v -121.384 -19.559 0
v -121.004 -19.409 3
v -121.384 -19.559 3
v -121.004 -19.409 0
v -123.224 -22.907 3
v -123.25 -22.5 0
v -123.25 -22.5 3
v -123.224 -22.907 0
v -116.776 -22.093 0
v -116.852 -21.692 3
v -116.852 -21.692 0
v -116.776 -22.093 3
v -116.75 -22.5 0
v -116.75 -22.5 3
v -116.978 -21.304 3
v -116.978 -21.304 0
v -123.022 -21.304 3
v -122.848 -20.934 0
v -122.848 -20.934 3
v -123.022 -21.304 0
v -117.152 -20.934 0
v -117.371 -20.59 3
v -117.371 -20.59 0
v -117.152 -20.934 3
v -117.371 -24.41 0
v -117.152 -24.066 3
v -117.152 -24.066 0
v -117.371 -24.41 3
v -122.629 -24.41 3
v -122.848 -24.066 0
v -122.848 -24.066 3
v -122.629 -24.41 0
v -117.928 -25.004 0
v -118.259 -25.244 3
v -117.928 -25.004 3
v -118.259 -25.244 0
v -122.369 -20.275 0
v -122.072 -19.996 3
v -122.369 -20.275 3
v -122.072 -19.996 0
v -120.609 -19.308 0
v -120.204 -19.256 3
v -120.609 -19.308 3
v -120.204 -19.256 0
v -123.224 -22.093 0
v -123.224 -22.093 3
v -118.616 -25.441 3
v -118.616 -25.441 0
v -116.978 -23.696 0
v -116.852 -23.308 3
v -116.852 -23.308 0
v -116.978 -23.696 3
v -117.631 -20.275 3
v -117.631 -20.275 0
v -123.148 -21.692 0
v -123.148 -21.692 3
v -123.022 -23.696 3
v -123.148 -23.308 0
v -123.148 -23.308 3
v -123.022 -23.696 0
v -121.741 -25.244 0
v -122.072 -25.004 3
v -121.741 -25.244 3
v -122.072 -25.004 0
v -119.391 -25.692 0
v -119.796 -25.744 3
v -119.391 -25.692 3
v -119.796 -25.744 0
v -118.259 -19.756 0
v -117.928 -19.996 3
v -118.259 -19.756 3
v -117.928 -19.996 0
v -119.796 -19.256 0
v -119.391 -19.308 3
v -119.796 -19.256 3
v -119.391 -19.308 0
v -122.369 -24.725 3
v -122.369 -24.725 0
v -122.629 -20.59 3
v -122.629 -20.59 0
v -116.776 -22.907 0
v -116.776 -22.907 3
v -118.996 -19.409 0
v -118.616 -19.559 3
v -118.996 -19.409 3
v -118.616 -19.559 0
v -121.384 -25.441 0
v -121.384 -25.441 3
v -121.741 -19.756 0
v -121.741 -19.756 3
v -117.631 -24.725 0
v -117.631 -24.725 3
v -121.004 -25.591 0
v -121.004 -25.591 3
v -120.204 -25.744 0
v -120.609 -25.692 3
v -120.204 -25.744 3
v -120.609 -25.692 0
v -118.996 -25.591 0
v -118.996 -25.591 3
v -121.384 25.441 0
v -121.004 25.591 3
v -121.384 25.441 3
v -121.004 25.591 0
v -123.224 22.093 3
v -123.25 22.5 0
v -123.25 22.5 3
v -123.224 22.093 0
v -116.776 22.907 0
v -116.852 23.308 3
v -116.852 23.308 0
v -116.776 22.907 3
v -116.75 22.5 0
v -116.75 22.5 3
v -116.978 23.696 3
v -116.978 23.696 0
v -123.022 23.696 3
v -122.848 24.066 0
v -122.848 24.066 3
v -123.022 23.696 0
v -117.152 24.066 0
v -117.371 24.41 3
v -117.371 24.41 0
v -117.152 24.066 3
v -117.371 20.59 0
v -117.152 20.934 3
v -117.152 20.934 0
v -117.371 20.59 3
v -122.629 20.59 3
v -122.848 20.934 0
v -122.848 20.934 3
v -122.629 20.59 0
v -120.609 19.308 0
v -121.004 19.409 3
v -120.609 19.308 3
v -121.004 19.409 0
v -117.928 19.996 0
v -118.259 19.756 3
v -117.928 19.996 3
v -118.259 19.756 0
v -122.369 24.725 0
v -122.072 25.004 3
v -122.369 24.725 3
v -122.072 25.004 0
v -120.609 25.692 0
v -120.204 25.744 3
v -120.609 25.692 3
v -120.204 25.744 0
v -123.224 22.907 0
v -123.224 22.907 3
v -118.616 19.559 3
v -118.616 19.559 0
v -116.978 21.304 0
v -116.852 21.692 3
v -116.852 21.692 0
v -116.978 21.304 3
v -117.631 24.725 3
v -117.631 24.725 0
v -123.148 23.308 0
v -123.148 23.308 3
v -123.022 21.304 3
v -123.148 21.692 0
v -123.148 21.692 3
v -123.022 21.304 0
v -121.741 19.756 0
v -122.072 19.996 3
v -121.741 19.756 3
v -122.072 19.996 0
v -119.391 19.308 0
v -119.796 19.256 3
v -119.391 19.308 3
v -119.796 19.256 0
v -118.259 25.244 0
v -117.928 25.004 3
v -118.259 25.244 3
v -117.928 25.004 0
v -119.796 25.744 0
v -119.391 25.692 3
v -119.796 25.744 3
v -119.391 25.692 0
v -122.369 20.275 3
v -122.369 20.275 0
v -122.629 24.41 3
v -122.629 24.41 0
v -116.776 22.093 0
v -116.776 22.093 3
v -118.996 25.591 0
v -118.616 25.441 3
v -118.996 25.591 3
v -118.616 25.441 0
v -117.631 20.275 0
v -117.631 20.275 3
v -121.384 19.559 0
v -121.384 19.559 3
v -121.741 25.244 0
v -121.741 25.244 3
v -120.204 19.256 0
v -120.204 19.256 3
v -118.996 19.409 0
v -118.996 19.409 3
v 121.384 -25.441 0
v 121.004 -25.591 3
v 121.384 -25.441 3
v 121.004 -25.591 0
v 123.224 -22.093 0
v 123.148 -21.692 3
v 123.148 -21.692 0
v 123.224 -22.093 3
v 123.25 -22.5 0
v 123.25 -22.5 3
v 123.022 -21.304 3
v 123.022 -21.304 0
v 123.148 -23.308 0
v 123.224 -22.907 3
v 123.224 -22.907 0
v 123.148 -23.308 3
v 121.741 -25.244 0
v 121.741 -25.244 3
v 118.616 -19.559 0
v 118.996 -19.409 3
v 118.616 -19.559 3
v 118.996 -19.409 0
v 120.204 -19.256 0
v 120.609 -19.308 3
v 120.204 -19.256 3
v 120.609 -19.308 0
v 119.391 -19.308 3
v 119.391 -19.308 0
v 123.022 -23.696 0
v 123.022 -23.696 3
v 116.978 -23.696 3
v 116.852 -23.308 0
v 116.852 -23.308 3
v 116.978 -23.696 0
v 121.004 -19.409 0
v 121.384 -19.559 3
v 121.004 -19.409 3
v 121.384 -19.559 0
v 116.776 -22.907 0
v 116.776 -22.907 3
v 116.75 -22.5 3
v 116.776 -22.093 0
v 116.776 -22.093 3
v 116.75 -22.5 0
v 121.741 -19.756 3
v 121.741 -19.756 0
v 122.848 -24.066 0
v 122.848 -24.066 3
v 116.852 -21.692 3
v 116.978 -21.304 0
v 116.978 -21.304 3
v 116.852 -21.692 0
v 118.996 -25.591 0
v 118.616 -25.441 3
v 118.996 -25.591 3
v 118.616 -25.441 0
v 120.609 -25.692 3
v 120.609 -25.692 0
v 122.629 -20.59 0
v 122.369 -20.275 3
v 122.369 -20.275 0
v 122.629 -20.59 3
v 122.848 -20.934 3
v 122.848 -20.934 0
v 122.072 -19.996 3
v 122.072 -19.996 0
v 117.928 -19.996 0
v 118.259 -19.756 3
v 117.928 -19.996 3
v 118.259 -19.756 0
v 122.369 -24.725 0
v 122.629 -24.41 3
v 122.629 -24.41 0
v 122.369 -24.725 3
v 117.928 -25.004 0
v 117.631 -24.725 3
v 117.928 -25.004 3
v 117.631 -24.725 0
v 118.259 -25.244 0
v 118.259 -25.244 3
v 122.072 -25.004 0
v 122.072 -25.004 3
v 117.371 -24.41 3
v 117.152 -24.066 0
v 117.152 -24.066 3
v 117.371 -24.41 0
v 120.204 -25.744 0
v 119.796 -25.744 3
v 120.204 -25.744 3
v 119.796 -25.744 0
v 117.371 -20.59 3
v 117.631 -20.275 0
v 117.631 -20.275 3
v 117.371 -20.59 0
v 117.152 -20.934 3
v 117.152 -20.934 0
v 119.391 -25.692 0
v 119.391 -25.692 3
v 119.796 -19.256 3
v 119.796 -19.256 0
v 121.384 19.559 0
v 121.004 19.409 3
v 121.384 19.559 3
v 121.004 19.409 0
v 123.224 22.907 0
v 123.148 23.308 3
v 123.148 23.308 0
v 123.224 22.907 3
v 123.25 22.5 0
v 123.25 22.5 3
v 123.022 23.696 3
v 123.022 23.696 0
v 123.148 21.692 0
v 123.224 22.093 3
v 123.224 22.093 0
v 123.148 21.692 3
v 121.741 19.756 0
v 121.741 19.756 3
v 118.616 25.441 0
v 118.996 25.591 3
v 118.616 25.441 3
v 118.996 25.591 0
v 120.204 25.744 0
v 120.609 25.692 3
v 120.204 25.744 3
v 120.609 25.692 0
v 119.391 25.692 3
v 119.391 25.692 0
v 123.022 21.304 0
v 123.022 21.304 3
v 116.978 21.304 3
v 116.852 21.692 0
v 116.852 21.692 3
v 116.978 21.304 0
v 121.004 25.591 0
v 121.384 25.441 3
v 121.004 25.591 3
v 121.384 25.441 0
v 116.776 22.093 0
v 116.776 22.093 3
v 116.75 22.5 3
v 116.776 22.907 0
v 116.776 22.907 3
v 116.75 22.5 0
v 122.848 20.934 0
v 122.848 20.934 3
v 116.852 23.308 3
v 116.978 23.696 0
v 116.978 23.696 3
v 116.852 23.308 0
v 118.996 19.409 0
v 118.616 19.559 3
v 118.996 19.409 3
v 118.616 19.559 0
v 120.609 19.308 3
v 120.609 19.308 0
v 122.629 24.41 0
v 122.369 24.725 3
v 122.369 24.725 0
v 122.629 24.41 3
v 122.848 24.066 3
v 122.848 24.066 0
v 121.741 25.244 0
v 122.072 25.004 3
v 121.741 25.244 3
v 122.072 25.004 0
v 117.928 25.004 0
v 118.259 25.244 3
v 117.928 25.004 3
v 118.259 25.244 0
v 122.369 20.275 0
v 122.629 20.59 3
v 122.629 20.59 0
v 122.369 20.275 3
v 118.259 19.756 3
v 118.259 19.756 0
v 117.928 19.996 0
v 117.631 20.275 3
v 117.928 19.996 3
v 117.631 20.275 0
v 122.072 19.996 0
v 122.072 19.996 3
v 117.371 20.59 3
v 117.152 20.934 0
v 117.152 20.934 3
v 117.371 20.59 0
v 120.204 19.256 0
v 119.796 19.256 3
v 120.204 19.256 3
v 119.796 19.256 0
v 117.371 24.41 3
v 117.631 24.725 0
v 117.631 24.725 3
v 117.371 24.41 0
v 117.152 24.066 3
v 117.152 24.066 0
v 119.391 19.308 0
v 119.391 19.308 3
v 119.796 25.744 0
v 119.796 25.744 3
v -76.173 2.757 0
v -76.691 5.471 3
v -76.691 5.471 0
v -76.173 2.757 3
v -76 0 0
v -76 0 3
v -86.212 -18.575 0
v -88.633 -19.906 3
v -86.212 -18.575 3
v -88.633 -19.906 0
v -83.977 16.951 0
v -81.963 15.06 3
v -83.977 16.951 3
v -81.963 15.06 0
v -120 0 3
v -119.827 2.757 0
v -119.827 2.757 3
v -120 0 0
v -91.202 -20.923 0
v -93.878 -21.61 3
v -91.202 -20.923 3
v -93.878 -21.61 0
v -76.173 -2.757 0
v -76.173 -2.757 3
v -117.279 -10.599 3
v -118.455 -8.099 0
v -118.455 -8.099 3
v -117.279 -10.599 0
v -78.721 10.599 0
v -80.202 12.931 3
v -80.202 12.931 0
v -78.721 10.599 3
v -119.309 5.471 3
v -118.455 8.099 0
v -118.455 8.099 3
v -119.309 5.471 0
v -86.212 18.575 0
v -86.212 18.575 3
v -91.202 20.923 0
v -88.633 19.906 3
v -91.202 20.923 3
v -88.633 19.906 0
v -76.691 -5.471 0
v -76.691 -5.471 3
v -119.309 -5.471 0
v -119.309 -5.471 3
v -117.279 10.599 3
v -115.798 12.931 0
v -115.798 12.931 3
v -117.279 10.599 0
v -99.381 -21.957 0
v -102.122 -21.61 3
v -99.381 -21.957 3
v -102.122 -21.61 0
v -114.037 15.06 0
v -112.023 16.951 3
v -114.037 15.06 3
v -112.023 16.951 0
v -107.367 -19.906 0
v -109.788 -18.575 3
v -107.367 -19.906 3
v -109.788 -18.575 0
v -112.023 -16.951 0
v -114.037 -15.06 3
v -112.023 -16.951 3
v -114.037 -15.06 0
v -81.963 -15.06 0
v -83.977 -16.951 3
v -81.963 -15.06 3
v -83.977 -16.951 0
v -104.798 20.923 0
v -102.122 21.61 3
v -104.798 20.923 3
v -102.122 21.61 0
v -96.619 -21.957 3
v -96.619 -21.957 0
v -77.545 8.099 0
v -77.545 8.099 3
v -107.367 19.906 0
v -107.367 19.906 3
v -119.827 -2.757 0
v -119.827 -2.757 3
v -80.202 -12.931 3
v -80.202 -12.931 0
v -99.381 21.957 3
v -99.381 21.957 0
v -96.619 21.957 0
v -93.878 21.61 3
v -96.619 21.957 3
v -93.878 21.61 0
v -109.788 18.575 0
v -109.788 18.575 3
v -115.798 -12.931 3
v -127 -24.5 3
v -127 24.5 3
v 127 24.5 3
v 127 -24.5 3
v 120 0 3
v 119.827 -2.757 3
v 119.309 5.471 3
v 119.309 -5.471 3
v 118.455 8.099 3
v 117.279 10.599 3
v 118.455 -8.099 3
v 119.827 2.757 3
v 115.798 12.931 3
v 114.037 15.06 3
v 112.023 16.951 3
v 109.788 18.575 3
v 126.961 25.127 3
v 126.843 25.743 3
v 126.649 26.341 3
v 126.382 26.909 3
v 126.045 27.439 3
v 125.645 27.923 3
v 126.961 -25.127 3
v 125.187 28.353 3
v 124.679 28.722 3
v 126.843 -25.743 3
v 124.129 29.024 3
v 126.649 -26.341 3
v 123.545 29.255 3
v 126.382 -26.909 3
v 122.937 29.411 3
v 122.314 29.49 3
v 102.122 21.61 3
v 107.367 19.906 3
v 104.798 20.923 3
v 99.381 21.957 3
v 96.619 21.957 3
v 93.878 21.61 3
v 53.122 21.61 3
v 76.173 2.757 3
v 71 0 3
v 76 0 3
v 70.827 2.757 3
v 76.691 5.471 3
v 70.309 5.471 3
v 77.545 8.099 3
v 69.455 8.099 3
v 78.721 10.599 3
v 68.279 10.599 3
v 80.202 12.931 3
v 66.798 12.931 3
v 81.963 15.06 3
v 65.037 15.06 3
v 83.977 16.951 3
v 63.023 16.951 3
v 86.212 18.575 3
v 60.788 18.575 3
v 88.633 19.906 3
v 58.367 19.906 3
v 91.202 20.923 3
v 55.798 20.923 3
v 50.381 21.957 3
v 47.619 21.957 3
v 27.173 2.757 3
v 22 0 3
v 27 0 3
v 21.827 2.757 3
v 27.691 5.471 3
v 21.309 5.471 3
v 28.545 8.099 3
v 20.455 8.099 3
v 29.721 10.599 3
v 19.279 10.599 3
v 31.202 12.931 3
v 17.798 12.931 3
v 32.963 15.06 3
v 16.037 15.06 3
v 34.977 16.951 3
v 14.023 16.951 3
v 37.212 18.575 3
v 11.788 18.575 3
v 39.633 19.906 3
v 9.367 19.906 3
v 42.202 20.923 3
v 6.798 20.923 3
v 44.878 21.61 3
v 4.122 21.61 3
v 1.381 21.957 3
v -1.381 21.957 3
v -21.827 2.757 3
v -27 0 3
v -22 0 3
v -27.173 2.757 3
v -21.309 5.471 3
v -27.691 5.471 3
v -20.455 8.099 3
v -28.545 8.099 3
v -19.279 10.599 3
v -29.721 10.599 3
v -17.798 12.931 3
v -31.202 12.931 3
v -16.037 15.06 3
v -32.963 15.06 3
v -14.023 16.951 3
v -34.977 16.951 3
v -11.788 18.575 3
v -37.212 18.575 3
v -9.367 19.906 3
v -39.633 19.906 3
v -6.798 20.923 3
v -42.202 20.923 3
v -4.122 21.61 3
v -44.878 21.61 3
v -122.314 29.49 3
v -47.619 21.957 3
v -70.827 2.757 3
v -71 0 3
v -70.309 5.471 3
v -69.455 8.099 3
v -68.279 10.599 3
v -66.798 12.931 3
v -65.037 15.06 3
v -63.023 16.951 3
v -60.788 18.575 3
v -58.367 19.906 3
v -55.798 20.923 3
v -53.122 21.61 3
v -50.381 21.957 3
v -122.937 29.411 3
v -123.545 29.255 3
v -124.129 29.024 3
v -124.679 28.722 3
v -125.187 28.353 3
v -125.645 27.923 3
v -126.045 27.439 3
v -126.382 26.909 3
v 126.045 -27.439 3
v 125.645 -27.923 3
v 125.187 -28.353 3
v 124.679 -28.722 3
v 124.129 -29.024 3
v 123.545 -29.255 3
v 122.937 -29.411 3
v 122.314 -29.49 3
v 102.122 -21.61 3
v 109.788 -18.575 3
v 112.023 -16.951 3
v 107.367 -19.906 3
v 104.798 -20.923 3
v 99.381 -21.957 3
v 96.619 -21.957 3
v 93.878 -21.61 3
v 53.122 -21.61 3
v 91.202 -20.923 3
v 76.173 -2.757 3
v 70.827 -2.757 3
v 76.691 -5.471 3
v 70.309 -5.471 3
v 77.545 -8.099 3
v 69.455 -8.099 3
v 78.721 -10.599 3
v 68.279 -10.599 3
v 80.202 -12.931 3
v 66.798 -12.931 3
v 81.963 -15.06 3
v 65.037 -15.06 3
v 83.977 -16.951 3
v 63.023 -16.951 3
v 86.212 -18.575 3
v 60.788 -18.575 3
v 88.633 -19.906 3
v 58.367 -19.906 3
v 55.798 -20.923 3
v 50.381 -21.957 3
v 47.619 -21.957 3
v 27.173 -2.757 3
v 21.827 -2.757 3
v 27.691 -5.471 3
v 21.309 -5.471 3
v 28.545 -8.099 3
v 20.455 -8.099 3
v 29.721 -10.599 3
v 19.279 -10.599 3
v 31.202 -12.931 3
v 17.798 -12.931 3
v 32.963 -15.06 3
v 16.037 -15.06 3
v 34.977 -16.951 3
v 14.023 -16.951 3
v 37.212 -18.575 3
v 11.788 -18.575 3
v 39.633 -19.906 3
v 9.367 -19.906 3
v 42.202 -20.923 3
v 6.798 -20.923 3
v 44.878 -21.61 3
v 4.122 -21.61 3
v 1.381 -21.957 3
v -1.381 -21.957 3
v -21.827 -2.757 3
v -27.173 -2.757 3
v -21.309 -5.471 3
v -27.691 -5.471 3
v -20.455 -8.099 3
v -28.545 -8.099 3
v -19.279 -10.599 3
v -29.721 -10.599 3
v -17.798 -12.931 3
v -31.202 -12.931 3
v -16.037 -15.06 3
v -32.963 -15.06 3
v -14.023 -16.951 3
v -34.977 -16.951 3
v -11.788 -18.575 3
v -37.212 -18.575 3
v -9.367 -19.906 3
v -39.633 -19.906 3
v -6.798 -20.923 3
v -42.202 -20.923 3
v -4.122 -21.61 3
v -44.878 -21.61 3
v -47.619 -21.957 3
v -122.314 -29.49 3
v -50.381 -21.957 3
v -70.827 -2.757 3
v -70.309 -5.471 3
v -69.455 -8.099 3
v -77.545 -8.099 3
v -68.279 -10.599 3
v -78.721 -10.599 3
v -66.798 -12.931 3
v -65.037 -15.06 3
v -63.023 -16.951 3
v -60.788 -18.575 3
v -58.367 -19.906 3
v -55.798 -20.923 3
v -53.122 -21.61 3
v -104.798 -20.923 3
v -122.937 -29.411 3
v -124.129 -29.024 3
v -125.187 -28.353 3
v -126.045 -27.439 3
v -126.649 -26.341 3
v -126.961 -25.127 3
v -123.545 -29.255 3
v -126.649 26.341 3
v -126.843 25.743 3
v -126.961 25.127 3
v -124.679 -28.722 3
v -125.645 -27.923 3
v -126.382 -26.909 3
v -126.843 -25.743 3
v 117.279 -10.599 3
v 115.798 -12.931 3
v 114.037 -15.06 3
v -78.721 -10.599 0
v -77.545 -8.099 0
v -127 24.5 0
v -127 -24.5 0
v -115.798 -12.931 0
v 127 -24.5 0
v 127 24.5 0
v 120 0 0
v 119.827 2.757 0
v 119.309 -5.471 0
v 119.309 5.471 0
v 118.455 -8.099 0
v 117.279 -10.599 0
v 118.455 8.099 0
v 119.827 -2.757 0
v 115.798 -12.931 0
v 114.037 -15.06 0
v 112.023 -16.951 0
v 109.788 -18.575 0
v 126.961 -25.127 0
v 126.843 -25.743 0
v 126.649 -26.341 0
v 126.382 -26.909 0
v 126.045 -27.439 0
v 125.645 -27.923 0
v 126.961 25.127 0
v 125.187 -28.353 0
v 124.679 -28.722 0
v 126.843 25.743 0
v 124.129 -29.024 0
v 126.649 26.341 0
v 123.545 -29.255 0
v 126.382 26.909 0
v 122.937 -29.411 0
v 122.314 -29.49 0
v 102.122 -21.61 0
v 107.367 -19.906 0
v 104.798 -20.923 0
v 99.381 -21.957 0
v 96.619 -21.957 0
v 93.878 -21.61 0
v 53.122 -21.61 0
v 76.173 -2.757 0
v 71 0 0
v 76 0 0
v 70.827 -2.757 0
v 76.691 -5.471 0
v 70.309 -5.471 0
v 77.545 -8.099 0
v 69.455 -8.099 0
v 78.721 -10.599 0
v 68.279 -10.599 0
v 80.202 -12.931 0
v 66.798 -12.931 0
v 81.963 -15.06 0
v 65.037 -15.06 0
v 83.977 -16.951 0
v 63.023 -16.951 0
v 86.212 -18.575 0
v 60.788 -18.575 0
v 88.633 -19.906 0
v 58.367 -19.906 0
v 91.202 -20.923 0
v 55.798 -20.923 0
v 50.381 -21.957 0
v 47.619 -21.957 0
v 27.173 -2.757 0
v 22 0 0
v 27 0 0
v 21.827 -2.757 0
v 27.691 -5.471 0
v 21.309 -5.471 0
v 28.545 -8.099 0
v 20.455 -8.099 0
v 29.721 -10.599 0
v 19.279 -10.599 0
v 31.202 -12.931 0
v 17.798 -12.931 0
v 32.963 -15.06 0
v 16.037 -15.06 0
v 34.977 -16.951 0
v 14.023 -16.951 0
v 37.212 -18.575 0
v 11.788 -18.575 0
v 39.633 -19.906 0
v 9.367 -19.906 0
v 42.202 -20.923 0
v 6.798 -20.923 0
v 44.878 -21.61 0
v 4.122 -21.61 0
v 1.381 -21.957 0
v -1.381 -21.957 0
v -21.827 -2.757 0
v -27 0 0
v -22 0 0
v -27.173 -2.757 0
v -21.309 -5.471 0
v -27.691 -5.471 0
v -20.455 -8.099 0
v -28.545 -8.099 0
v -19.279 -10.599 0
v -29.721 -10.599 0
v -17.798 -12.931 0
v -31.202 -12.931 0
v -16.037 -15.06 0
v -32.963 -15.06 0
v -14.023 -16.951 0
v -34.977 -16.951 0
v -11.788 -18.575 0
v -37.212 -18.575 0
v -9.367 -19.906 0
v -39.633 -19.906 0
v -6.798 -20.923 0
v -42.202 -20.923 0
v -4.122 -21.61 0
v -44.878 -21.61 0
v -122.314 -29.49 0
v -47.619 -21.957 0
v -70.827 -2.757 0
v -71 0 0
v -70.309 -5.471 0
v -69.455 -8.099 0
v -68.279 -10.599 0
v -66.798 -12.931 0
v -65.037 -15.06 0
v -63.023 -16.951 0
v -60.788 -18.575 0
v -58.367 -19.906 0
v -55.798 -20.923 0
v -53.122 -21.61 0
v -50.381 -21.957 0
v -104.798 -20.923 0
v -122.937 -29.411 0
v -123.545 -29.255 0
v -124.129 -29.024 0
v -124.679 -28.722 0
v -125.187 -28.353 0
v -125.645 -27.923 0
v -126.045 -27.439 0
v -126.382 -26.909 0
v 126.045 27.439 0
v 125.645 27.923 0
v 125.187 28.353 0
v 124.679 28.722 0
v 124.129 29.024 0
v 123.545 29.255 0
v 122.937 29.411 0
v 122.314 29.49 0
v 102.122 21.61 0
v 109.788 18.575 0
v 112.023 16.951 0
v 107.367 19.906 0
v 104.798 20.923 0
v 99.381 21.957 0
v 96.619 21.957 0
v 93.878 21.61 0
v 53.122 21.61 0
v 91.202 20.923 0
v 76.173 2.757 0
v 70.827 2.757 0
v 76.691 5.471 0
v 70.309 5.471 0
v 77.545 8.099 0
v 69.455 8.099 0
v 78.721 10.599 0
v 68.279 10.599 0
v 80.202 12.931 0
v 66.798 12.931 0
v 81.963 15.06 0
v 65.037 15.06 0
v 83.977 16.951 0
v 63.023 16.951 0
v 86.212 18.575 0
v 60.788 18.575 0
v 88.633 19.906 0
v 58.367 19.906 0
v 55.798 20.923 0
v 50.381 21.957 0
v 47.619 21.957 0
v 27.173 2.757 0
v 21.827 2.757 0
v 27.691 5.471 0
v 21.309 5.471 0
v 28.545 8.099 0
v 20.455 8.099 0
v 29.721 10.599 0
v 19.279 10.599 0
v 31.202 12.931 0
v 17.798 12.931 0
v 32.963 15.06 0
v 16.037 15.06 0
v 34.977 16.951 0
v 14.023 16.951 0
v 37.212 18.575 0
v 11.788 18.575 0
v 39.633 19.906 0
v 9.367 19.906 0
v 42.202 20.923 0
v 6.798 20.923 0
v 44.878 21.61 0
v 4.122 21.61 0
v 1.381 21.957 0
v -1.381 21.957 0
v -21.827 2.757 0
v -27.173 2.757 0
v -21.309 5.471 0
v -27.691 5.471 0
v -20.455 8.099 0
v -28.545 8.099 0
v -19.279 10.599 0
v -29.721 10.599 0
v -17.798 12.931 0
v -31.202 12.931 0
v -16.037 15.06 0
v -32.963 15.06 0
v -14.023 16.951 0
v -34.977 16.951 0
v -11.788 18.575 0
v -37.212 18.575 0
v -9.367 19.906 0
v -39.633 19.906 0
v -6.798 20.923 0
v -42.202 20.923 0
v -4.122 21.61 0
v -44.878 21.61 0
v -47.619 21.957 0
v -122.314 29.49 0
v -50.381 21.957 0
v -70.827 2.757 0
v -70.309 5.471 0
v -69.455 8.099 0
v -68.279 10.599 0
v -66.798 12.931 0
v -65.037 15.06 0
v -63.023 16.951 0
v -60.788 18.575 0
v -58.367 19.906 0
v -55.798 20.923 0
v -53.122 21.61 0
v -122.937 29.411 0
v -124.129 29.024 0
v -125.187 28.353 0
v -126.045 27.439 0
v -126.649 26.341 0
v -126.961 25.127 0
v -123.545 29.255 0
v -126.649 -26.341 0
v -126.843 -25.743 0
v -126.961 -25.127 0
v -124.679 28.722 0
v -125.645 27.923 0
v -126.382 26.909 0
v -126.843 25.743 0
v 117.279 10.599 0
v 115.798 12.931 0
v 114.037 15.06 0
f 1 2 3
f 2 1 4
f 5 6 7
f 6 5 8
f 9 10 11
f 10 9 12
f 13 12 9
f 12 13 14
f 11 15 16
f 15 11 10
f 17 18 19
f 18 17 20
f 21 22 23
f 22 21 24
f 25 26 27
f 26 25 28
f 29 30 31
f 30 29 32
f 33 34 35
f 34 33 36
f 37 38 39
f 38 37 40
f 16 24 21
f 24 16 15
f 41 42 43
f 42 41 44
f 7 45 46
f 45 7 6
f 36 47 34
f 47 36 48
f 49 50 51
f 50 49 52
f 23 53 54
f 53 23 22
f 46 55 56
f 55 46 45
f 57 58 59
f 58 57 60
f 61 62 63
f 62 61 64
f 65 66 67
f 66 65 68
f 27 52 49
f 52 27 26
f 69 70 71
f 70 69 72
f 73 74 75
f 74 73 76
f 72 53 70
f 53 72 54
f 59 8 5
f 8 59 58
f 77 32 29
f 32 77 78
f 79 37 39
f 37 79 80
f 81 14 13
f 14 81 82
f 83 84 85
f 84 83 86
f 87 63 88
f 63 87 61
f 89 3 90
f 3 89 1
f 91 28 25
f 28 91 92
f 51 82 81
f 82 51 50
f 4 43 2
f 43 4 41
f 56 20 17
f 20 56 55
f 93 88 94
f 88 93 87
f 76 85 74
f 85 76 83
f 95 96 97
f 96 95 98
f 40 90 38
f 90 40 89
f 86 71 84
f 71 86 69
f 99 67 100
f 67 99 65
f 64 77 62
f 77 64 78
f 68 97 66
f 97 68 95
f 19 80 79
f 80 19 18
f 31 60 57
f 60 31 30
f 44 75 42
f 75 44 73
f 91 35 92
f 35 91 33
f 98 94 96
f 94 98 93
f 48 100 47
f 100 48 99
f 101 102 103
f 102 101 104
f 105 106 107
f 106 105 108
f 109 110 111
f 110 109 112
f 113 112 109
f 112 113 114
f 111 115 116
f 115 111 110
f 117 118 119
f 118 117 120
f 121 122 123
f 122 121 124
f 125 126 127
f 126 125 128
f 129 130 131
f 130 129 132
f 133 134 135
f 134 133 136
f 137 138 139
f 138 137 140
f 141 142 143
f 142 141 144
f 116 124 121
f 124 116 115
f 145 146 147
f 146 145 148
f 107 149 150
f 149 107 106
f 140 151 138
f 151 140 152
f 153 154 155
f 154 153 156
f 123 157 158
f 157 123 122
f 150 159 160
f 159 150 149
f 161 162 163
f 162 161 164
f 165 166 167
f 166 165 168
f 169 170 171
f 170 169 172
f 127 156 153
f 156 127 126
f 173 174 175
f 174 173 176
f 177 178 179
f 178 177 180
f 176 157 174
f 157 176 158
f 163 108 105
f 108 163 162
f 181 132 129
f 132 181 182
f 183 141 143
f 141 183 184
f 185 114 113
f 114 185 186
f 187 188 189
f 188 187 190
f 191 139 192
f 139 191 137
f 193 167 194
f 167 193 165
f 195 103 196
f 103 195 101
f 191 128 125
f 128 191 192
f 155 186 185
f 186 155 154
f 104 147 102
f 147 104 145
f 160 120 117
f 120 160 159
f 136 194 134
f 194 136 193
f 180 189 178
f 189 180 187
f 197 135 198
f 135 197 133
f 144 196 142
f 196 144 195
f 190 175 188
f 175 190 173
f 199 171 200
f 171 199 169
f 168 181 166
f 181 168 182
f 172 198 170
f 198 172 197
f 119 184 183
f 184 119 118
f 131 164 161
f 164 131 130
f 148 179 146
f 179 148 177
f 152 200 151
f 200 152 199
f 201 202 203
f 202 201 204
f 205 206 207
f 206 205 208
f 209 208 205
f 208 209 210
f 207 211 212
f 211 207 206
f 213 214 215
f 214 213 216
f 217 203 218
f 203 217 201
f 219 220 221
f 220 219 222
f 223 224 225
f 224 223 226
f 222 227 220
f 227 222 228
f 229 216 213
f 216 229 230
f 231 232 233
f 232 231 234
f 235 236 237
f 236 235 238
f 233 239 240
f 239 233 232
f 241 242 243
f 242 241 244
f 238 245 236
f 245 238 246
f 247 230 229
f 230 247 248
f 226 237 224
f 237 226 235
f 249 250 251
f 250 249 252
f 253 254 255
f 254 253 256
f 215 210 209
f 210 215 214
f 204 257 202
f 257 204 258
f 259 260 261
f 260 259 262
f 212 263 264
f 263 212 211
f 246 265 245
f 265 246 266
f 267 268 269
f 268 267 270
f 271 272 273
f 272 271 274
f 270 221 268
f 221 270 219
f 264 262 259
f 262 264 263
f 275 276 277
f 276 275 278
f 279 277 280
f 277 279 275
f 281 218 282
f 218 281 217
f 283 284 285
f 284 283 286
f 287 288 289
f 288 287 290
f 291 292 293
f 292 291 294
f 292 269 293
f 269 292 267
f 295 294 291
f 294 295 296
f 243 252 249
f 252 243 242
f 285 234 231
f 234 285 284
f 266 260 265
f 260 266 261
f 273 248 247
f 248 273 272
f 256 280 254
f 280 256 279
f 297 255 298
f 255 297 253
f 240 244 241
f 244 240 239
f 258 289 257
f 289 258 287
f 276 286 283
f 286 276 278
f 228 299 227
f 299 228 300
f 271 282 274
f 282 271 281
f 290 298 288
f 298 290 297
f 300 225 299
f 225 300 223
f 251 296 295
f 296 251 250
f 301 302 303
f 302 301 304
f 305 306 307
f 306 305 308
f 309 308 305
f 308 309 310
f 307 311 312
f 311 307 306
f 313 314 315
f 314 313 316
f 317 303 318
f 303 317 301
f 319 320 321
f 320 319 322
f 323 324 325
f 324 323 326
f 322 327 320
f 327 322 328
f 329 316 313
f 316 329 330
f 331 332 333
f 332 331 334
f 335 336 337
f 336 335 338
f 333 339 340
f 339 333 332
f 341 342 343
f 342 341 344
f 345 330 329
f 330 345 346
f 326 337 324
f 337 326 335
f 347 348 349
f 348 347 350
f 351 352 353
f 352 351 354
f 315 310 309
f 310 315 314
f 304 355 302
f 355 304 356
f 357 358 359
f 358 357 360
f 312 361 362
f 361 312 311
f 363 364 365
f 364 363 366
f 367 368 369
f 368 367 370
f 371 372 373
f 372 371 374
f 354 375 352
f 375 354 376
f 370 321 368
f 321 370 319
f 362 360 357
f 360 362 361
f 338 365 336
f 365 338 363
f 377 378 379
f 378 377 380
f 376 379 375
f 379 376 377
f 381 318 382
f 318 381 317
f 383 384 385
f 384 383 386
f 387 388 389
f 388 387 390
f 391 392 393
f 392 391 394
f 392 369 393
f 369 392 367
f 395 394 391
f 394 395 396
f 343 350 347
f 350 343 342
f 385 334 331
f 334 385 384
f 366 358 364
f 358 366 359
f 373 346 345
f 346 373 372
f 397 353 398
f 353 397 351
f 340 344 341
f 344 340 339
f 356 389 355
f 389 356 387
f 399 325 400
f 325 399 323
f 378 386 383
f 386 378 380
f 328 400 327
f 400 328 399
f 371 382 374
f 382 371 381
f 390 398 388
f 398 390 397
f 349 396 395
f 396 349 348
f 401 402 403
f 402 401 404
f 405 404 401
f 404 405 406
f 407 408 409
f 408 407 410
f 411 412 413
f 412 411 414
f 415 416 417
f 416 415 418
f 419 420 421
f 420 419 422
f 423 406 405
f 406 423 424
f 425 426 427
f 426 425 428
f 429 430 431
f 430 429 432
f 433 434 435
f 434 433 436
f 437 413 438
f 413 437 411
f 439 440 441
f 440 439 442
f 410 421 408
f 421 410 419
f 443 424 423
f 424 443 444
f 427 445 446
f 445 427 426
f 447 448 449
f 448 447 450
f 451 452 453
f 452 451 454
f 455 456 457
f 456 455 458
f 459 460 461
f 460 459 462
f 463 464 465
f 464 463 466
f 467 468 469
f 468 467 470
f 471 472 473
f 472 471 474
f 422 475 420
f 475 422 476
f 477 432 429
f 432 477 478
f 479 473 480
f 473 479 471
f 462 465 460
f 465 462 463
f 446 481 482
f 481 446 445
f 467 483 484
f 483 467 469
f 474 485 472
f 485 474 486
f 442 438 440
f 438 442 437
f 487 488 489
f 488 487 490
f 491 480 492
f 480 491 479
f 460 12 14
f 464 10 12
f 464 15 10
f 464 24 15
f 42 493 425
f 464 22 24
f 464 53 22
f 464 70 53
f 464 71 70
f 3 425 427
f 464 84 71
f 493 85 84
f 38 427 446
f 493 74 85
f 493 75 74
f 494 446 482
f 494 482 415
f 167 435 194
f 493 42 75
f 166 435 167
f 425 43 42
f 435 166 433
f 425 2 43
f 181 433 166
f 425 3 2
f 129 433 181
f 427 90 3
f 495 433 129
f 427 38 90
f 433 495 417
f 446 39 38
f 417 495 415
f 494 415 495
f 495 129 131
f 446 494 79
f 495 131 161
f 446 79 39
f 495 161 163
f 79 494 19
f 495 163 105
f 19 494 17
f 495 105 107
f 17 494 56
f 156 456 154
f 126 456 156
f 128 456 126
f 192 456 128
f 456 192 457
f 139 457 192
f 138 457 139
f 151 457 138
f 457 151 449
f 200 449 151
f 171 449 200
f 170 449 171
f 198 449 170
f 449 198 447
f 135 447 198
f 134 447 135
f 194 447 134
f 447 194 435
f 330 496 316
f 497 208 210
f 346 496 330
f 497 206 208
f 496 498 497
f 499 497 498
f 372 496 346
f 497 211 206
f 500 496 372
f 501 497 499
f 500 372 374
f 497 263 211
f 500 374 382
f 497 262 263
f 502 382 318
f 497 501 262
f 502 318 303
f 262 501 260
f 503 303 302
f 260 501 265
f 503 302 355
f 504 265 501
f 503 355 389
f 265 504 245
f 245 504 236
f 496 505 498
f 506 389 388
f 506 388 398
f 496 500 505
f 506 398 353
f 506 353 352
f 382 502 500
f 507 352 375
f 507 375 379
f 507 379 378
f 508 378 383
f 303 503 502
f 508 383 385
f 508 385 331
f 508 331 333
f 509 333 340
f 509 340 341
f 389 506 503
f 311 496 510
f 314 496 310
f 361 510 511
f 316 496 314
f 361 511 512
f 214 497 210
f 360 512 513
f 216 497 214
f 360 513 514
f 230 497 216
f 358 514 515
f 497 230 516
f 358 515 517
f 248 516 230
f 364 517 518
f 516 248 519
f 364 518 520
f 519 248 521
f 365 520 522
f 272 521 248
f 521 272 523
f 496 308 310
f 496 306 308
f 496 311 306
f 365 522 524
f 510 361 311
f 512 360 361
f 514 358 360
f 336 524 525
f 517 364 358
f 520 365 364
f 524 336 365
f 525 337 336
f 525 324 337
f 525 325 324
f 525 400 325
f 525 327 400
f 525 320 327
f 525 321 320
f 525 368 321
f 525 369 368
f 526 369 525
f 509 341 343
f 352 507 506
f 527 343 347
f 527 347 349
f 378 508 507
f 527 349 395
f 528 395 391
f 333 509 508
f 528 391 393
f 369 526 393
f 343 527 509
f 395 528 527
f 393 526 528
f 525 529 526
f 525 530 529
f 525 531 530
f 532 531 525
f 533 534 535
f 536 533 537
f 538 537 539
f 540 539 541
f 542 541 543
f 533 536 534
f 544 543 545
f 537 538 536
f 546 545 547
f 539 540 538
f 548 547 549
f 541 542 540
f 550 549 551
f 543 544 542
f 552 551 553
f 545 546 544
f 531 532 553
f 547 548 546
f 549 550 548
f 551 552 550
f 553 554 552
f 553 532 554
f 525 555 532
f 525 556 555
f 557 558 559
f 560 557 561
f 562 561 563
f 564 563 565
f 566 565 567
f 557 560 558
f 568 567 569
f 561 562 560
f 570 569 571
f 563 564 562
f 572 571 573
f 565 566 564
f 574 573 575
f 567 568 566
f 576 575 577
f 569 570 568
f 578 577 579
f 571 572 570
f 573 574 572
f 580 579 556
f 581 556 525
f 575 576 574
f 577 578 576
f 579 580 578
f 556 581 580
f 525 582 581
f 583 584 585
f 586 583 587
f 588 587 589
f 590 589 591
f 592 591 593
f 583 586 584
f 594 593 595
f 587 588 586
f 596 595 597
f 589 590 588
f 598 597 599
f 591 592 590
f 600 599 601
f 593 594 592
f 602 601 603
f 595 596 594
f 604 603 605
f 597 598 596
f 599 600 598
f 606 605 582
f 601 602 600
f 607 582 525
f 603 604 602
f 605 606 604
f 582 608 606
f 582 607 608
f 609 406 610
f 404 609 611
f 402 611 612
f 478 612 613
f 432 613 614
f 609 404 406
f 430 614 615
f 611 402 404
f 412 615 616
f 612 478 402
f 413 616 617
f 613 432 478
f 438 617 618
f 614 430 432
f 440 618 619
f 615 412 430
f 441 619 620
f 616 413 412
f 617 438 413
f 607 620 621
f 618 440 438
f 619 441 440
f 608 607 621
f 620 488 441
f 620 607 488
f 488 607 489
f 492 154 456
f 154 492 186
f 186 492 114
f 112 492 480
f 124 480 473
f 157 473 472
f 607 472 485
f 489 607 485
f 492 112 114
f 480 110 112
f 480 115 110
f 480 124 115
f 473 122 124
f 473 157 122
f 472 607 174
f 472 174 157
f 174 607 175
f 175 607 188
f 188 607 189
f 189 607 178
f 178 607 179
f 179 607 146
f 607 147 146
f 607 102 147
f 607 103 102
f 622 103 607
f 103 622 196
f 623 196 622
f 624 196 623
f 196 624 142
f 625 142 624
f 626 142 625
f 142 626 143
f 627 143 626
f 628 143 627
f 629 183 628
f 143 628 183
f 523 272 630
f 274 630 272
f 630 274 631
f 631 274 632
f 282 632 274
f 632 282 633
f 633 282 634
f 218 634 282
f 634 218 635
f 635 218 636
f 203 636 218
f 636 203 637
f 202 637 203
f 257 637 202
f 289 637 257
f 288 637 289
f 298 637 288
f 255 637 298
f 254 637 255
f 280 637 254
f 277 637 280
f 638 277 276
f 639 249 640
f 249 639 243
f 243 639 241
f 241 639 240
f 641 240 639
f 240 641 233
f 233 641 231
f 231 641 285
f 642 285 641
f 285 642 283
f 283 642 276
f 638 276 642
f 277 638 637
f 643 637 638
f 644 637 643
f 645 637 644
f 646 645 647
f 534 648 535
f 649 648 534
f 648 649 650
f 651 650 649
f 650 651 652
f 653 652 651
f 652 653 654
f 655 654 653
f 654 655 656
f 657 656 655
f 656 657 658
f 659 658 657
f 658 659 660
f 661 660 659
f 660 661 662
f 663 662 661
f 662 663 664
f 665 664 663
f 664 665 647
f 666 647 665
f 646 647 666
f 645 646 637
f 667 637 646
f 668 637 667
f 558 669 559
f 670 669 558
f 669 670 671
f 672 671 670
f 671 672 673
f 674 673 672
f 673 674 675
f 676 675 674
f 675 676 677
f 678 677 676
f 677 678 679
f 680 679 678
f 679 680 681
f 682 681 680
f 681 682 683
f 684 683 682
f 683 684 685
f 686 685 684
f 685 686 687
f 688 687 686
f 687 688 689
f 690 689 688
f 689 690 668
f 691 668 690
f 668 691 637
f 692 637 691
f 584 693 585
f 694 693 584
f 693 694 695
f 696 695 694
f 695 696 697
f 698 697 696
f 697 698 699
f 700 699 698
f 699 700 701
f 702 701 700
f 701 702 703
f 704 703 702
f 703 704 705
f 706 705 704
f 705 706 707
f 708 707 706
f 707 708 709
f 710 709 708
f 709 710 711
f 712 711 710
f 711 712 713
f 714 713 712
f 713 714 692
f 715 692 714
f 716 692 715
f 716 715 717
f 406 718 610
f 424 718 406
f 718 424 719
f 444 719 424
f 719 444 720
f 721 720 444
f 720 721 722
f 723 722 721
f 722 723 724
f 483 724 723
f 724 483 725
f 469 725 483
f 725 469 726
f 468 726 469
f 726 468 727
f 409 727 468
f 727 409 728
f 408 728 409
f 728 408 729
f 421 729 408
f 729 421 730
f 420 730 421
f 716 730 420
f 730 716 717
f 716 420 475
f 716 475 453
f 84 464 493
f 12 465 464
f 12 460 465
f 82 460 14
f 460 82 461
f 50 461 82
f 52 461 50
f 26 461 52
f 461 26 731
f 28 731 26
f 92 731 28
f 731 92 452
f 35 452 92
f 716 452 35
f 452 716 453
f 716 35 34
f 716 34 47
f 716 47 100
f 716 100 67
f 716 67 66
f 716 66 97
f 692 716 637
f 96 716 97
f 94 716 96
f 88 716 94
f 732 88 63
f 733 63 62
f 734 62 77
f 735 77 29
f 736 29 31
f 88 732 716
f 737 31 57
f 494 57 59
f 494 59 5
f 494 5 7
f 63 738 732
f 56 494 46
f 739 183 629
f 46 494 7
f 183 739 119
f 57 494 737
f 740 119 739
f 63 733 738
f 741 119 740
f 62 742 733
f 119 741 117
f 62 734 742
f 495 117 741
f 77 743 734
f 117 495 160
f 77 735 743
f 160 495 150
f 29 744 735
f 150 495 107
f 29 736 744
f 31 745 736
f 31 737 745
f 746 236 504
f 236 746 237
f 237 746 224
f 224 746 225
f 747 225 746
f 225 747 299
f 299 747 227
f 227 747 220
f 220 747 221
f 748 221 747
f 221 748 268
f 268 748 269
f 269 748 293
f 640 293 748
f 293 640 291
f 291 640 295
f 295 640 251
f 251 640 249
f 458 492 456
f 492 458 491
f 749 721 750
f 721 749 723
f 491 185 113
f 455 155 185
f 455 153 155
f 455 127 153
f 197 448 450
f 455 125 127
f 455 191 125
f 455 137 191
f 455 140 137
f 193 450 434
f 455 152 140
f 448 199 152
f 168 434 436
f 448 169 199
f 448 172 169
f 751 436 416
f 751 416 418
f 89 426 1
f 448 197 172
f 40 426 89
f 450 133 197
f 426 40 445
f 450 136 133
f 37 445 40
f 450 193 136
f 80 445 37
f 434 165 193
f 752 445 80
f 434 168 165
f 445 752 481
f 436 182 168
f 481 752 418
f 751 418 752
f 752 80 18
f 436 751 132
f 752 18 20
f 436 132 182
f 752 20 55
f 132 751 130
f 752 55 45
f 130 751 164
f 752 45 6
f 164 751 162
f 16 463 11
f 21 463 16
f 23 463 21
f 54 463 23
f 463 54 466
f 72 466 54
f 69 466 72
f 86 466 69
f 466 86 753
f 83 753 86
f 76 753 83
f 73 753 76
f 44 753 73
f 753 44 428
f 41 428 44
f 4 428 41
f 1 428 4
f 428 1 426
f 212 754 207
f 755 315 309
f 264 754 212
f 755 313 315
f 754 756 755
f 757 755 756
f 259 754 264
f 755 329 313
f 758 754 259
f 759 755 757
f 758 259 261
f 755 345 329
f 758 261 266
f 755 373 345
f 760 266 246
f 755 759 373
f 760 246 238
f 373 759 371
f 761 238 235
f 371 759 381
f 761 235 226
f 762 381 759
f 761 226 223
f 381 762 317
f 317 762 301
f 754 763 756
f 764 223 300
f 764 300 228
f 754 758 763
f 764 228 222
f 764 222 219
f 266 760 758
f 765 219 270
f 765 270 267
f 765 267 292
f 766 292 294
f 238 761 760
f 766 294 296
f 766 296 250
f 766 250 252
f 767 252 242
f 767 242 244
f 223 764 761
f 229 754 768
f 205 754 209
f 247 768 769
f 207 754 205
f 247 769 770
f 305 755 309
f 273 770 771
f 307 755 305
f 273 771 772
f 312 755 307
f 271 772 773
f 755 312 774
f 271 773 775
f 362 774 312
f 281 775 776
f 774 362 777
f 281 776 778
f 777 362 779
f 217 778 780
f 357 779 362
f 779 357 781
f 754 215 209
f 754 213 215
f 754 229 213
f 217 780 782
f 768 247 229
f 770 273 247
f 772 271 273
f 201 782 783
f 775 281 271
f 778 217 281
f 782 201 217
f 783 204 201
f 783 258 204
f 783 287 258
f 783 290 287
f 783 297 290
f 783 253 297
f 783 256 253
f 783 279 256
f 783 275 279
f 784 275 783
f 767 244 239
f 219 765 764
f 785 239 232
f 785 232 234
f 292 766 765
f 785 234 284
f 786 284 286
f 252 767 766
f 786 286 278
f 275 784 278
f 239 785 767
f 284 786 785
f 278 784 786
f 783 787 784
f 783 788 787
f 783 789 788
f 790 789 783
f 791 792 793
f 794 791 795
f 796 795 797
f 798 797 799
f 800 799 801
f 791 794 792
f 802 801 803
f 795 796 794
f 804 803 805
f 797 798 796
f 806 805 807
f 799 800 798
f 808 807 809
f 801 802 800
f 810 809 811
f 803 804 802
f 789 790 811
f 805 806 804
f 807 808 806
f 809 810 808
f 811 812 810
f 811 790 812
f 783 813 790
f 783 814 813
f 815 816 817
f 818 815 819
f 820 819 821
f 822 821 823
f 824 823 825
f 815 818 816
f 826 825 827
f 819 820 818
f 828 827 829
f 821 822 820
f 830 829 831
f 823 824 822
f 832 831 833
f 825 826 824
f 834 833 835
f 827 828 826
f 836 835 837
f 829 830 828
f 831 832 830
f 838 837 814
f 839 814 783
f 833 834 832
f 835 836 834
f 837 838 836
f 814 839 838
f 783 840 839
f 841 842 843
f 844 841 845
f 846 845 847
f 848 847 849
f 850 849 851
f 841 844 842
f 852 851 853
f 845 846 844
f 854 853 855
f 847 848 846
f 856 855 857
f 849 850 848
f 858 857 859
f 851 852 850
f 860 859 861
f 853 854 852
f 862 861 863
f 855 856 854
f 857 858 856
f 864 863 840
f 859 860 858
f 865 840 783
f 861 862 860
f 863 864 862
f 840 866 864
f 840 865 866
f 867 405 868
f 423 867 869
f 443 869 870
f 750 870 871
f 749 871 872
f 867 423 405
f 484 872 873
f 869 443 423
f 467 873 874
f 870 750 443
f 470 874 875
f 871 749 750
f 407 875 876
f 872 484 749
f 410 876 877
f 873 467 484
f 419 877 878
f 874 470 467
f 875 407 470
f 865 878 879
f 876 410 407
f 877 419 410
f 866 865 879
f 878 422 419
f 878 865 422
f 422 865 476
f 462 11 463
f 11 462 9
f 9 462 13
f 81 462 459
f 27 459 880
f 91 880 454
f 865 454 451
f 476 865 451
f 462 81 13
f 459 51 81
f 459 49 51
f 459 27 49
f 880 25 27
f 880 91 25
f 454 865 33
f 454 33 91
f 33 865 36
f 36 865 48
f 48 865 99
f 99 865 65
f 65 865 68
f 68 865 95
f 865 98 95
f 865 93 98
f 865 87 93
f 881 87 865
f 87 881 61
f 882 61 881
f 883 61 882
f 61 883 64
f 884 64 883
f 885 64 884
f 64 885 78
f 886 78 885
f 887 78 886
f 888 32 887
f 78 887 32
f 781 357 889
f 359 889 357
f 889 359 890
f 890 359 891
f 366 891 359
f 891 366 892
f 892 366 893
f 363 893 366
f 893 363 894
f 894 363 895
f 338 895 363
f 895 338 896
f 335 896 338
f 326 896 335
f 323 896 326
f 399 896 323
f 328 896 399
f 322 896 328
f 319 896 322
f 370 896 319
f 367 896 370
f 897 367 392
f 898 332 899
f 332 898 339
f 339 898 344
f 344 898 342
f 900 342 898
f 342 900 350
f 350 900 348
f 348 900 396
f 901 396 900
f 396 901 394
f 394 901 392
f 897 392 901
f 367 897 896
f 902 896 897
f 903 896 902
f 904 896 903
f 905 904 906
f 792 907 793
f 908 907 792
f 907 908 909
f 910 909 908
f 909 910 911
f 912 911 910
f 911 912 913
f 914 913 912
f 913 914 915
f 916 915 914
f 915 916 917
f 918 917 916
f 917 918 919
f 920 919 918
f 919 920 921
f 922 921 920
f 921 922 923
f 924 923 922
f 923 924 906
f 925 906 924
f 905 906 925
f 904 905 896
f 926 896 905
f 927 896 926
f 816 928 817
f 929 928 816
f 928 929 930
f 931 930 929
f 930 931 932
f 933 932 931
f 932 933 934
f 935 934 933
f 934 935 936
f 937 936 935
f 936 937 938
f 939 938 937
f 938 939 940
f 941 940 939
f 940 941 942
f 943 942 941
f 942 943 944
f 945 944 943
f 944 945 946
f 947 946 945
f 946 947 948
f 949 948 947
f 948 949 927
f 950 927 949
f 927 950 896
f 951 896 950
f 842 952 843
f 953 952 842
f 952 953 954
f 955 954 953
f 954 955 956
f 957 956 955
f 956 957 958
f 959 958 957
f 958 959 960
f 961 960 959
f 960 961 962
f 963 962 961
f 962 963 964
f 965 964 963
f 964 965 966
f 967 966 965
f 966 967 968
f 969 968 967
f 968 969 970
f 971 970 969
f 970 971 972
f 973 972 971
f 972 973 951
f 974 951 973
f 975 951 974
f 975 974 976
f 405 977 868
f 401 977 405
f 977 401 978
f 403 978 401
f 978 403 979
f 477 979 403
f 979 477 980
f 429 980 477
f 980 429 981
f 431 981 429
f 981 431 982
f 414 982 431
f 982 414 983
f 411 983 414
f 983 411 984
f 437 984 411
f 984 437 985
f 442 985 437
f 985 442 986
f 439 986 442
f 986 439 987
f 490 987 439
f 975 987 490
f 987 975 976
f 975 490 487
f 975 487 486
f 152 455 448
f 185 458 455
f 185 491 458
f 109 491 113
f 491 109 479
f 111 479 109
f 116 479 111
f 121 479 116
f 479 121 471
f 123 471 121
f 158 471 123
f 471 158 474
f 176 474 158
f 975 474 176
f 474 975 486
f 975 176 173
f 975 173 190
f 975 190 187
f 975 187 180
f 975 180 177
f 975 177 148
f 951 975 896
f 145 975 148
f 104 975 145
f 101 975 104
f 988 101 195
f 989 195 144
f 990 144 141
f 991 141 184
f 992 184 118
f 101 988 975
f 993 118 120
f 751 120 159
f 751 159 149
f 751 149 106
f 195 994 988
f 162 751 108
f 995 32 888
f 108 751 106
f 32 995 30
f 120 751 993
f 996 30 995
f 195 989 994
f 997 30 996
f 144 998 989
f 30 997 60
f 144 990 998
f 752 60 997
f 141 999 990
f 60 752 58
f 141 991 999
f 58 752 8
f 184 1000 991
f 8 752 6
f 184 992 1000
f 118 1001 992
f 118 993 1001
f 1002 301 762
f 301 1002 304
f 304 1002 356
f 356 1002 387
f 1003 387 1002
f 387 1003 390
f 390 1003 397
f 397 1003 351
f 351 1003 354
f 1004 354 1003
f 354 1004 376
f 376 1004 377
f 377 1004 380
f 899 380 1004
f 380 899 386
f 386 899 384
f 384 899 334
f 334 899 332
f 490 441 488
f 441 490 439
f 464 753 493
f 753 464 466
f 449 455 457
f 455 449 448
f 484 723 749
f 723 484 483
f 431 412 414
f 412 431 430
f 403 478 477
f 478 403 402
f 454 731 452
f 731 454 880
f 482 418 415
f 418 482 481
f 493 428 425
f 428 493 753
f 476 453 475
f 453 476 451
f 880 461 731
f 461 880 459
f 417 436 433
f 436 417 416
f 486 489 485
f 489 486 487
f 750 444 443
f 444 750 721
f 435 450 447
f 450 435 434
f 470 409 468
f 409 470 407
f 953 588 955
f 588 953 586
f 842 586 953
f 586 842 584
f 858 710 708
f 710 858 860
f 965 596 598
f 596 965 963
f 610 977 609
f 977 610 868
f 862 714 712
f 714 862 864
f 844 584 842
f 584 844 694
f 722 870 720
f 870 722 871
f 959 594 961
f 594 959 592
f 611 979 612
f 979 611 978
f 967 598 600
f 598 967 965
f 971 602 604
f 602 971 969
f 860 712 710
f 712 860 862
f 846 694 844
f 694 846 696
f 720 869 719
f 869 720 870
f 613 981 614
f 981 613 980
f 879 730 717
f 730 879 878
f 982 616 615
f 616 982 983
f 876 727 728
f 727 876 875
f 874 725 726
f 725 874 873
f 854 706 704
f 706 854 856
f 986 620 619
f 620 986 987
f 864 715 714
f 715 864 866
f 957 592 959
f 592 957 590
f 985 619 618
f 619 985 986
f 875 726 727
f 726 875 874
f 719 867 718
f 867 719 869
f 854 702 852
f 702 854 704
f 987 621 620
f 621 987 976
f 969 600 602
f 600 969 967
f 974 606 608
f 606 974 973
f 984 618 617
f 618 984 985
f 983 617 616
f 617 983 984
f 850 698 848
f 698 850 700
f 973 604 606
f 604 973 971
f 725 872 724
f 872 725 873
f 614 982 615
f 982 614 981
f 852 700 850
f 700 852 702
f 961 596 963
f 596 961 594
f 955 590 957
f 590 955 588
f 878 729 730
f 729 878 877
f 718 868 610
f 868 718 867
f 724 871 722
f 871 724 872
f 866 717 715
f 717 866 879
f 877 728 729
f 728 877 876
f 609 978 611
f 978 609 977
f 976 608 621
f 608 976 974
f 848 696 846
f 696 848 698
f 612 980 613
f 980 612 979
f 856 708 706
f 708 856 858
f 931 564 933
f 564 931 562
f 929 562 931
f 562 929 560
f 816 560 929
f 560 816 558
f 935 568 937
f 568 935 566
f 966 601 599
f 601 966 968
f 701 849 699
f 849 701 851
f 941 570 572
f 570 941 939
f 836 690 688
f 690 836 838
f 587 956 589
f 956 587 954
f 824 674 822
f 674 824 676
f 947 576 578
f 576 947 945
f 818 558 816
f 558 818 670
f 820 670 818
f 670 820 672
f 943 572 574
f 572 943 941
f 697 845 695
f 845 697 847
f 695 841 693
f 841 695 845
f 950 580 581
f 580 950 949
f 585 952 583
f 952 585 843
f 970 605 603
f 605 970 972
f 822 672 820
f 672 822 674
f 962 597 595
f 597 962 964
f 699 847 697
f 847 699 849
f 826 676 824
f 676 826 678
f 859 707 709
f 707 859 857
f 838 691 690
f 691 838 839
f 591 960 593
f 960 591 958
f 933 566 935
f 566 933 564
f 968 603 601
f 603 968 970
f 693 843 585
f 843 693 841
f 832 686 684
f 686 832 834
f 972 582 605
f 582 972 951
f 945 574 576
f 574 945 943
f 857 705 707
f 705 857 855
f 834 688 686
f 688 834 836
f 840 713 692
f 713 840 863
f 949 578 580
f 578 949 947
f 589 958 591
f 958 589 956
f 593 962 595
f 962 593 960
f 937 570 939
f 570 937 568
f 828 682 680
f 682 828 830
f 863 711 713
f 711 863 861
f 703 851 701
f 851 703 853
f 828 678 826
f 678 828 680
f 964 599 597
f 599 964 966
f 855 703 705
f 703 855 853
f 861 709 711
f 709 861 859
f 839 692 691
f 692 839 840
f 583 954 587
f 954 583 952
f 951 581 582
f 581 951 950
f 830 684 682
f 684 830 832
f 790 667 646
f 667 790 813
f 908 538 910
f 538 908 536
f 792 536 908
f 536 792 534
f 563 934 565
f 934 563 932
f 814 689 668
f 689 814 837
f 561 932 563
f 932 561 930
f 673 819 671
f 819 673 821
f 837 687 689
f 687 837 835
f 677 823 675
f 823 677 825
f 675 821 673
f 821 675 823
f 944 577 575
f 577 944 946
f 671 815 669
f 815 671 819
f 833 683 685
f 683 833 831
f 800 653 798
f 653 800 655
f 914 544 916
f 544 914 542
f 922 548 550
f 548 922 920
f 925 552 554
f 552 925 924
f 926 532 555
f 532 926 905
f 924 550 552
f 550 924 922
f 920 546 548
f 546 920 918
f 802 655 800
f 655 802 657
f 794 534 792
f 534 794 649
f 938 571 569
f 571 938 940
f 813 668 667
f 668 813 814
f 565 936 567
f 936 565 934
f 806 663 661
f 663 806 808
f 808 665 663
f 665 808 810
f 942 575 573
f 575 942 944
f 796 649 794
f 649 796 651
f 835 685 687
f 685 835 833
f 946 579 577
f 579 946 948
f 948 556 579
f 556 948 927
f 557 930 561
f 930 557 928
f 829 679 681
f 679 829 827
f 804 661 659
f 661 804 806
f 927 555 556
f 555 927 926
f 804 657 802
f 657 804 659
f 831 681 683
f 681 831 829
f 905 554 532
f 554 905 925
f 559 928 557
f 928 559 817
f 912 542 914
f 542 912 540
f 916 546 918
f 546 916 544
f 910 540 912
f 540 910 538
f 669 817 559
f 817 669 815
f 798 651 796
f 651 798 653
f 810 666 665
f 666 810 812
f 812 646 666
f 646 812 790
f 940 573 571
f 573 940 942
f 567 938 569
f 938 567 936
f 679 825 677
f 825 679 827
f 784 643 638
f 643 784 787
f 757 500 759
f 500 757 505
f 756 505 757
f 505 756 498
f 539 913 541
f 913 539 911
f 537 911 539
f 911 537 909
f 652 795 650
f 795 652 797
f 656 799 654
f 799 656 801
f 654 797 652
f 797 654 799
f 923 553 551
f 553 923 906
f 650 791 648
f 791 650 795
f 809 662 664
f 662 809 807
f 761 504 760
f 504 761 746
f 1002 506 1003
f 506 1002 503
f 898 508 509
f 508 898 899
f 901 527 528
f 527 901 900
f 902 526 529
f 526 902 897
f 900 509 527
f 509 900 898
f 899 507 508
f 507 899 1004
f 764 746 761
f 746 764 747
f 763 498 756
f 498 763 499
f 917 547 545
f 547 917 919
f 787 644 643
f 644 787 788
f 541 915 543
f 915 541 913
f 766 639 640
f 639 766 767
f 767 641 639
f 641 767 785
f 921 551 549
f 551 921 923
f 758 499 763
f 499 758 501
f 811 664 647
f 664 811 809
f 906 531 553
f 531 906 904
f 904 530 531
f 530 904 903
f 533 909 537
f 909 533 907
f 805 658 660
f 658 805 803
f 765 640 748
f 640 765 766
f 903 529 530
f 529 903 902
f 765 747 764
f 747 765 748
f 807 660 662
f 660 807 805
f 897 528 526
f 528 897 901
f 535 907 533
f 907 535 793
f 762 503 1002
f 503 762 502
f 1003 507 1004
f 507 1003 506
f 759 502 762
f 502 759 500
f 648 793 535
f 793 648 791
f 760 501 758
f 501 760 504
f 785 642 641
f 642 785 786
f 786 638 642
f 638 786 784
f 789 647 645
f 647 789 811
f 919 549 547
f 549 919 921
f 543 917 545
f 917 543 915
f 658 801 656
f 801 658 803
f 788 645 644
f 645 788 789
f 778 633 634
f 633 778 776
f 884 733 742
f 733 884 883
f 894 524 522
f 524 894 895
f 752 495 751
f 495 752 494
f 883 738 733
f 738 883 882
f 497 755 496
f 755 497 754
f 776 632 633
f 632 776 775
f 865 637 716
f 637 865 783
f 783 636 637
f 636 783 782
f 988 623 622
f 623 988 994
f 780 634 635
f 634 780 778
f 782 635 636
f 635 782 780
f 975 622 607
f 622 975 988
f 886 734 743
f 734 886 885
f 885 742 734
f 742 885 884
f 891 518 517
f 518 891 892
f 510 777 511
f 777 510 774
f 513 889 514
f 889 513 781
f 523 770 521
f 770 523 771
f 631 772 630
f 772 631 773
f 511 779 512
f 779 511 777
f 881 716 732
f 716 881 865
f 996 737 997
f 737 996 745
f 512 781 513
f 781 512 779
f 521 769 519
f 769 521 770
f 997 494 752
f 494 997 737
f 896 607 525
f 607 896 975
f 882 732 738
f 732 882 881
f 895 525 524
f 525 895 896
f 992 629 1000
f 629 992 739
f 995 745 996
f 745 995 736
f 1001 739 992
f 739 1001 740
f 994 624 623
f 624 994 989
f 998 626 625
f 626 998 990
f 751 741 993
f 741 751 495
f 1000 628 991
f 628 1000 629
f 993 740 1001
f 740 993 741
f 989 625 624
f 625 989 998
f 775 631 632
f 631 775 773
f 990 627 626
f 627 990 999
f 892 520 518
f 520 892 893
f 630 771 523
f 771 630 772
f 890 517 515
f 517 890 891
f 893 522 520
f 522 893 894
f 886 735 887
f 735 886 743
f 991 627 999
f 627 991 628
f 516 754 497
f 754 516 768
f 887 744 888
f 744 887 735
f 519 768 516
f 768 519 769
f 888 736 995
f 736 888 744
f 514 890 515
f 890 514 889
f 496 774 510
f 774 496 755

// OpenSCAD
$fn = 50;


difference() {
	union() {
		hull() {
			translate(v = [-122.0000000000, 24.5000000000, 0]) {
				cylinder(h = 3, r = 5);
			}
			translate(v = [122.0000000000, 24.5000000000, 0]) {
				cylinder(h = 3, r = 5);
			}
			translate(v = [-122.0000000000, -24.5000000000, 0]) {
				cylinder(h = 3, r = 5);
			}
			translate(v = [122.0000000000, -24.5000000000, 0]) {
				cylinder(h = 3, r = 5);
			}
		}
	}
	union() {
		#translate(v = [-120.0000000000, -22.5000000000, -100.0000000000]) {
			cylinder(h = 200, r = 3.2500000000);
		}
		#translate(v = [-120.0000000000, 22.5000000000, -100.0000000000]) {
			cylinder(h = 200, r = 3.2500000000);
		}
		#translate(v = [120.0000000000, -22.5000000000, -100.0000000000]) {
			cylinder(h = 200, r = 3.2500000000);
		}
		#translate(v = [120.0000000000, 22.5000000000, -100.0000000000]) {
			cylinder(h = 200, r = 3.2500000000);
		}
		#translate(v = [-98.0000000000, 0, 0]) {
			cylinder(h = 3, r = 22.0000000000);
		}
		#translate(v = [-49.0000000000, 0, 0]) {
			cylinder(h = 3, r = 22.0000000000);
		}
		#cylinder(h = 3, r = 22.0000000000);
		#translate(v = [49.0000000000, 0, 0]) {
			cylinder(h = 3, r = 22.0000000000);
		}
		#translate(v = [98.0000000000, 0, 0]) {
			cylinder(h = 3, r = 22.0000000000);
		}
	}
}
